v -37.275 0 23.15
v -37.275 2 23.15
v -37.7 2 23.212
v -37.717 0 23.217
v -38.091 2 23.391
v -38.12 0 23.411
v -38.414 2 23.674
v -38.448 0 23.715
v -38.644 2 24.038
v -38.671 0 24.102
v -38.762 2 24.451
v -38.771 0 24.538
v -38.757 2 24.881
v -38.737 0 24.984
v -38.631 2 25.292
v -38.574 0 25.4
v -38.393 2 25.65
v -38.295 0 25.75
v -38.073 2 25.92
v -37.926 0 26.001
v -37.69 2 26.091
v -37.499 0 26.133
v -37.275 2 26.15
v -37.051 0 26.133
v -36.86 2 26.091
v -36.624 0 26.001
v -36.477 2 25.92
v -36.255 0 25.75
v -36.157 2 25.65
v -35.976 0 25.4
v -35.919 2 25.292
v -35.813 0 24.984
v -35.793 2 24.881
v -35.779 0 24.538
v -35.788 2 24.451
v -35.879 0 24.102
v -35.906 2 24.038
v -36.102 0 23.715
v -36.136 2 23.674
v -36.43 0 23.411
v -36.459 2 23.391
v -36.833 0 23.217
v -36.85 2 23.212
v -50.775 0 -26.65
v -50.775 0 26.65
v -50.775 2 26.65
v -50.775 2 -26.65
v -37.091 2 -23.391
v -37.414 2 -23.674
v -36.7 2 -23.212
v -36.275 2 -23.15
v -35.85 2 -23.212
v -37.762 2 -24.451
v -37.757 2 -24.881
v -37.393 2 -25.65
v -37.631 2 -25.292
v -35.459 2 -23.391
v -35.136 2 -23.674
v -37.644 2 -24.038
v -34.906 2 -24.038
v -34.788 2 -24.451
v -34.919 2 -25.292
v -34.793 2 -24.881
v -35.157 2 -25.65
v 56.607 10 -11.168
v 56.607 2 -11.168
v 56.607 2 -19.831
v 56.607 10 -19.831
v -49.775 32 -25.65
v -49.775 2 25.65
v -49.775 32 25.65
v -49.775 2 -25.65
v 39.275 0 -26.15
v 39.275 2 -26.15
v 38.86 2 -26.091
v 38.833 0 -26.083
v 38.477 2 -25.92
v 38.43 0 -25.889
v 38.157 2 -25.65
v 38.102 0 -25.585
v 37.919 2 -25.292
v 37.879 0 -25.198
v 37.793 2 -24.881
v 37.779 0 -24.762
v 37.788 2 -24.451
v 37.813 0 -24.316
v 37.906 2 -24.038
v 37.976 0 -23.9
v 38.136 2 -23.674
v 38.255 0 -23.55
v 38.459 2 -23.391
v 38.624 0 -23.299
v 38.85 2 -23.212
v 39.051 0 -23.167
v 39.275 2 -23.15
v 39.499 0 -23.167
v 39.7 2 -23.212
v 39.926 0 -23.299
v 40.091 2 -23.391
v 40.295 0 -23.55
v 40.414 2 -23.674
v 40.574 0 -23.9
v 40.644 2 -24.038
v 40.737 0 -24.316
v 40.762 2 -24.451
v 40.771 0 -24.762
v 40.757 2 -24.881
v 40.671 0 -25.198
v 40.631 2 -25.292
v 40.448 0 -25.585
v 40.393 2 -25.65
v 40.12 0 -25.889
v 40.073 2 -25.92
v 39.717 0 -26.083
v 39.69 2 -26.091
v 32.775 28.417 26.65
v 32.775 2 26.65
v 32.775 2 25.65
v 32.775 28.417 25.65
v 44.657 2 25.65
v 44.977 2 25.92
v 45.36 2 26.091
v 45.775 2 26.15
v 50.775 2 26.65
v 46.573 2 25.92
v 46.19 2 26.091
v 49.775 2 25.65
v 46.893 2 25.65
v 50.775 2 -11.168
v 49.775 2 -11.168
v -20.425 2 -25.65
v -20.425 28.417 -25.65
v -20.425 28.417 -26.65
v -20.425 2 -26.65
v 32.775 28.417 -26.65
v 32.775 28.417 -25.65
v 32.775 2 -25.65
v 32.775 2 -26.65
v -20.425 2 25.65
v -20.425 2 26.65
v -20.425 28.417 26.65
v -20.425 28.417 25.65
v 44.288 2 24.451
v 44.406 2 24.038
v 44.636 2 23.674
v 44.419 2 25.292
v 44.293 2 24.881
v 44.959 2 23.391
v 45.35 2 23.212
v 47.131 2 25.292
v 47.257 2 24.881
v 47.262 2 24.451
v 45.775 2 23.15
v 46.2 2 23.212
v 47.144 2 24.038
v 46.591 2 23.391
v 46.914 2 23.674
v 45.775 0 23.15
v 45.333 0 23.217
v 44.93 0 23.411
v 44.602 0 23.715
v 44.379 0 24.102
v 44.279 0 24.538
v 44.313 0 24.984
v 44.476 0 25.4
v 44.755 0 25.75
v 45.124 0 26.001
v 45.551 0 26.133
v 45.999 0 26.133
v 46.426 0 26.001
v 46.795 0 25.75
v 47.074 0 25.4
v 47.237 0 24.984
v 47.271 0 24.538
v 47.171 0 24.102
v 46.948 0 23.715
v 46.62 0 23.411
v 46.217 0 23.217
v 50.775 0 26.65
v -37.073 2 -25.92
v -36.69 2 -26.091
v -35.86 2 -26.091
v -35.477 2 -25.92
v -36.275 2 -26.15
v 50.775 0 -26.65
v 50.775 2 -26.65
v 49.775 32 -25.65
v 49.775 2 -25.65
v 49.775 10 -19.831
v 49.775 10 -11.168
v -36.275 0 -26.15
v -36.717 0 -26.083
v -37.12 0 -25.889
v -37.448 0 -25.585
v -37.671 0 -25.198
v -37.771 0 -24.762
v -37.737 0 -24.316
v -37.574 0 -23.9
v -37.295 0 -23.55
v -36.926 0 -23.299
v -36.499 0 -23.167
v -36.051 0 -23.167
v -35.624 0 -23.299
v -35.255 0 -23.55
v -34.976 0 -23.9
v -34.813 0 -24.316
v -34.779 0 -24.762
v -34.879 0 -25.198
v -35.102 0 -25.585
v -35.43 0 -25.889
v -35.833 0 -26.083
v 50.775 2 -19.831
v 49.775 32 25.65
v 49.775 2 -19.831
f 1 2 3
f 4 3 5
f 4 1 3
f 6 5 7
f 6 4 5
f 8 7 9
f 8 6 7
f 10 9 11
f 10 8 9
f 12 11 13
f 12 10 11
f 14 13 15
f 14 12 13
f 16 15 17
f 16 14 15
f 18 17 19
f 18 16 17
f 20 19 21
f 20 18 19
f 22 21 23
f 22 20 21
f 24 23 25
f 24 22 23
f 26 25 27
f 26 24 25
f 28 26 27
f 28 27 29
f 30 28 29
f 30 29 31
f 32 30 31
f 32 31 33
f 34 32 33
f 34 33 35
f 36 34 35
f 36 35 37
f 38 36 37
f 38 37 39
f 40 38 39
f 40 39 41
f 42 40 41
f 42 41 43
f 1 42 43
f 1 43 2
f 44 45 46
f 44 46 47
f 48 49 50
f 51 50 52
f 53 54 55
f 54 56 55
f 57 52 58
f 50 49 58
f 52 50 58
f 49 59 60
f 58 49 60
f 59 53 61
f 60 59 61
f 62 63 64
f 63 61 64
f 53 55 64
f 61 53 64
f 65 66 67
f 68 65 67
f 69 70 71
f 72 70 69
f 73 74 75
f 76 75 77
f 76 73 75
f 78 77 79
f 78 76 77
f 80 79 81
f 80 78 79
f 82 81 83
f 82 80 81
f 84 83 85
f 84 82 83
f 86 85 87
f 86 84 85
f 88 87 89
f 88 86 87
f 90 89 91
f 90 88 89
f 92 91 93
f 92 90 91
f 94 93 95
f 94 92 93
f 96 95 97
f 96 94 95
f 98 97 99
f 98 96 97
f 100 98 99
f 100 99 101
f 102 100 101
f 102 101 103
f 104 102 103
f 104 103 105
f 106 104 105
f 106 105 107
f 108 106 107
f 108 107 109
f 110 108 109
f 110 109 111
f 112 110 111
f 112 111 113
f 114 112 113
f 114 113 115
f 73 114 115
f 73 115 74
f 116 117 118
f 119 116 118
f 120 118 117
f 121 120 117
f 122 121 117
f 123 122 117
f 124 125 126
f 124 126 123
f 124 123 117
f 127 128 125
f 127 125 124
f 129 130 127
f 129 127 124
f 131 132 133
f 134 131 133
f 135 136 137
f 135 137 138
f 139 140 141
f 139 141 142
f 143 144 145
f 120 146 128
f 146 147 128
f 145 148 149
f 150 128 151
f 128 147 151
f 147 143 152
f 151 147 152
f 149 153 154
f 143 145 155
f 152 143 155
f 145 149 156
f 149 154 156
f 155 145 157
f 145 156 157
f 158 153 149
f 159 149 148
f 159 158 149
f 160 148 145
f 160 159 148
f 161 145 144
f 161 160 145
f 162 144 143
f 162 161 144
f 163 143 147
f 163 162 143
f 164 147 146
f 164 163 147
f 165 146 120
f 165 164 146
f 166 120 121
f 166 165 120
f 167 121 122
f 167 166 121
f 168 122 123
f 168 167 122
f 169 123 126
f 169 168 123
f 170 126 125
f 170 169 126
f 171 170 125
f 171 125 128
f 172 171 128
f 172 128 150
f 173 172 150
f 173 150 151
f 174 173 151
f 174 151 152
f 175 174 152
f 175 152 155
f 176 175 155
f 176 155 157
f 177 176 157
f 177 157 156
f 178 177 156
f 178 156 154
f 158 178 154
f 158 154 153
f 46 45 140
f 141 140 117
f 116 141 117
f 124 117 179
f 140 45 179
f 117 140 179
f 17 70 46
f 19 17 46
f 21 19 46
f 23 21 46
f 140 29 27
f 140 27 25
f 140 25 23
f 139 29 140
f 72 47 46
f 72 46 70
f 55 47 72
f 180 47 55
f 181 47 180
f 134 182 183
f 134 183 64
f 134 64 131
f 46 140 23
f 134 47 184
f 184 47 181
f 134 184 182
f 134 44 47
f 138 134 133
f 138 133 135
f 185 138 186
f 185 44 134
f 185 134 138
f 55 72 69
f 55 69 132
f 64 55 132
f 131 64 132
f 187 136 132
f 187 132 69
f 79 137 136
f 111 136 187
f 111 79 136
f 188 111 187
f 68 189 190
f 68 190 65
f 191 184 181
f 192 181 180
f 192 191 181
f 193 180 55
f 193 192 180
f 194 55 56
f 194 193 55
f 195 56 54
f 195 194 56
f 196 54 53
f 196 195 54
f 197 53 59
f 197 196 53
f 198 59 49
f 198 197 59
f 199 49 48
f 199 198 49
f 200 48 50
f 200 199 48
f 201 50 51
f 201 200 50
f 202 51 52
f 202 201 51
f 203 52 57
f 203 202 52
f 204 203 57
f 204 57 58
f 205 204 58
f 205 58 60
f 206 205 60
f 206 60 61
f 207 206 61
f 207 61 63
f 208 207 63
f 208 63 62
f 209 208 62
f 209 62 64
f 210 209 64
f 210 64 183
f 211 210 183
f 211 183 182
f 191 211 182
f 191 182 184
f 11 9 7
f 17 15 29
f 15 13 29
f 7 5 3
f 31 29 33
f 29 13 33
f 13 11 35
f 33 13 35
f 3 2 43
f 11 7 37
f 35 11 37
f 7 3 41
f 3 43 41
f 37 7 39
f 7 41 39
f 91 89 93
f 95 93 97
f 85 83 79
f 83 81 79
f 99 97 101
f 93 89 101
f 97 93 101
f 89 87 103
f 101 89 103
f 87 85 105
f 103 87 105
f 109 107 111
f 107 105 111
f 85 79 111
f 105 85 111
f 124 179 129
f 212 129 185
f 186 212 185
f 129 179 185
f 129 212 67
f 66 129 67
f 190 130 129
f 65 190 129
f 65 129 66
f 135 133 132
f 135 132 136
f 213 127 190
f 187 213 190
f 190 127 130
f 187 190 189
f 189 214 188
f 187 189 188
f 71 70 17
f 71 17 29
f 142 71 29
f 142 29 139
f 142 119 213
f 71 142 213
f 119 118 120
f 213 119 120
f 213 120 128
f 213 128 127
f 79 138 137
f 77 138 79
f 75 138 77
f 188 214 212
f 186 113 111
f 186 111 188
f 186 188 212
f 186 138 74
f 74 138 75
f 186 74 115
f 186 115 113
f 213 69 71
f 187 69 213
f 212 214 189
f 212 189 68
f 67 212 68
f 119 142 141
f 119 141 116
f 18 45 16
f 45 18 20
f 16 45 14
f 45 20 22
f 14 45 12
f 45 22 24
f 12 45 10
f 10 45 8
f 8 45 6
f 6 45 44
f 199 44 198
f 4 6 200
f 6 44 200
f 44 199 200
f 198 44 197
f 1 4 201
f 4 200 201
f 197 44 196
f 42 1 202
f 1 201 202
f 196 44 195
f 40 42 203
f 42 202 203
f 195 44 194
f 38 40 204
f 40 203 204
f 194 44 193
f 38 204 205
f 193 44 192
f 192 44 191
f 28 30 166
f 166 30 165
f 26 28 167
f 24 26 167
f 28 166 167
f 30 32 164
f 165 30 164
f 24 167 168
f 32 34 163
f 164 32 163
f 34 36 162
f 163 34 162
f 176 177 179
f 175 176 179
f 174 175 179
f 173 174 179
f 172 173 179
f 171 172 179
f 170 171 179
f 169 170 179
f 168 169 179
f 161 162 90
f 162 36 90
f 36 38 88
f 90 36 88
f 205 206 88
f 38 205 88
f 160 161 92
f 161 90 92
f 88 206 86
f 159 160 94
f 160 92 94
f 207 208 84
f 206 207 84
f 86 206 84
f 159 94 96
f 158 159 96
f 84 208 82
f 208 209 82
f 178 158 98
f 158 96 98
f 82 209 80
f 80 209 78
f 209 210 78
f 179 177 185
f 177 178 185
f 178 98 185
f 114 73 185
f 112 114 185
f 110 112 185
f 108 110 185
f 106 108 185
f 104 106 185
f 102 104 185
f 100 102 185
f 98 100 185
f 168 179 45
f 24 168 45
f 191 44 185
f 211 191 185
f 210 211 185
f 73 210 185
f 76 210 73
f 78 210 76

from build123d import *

# Parameters (mm, degrees)
ESBO_O1_W                  = 101.55
ESBO_O1_H                  = 53.3
RESSALTO_EXTRUS_O1_DEPTH   = 2
ESBO_O2_W                  = 53.2
ESBO_O2_H                  = 53.3
RESSALTO_EXTRUS_O2_DEPTH   = 26.416687688
CORTE_EXTRUS_O2_DEPTH      = 64.136079332
CORTE_EXTRUS_O2_DEPTH_BACK = 64.64
ESBO_O5_R                  = 1.5
ESBO_O6_W                  = 99.55
ESBO_O6_H                  = 51.3
RESSALTO_EXTRUS_O4_DEPTH   = 30
ESBO_O7_W                  = 16.925657076
ESBO_O7_H                  = 8.663776605
RESSALTO_EXTRUS_O5_DEPTH   = 8


with BuildPart() as part:
    # Esboço1 → Ressalto-extrusão1 (new body)
    with BuildSketch(Plane(origin=(0, 0, 0), x_dir=(1, 0, 0), z_dir=(0, 1, 0))):
        Rectangle(ESBO_O1_W, ESBO_O1_H)
    extrude(amount=RESSALTO_EXTRUS_O1_DEPTH)

    # Esboço2 → Ressalto-extrusão2 (add)
    with BuildSketch(Plane(origin=(0, 2, 0), x_dir=(1, 0, 0), z_dir=(0, 1, 0))):
        with Locations((6.175, 0)):
            Rectangle(ESBO_O2_W, ESBO_O2_H)
    extrude(amount=RESSALTO_EXTRUS_O2_DEPTH)

    # Esboço5 → Corte-extrusão2 (cut, two sides: drawn at the far end of the back side and taken through both)
    with BuildSketch(Plane(origin=(0, 2, 0), x_dir=(1, 0, 0), z_dir=(0, 1, 0)).offset(-CORTE_EXTRUS_O2_DEPTH_BACK)):
        with Locations(Location((-37.275, -24.65, 0), (0, 0, 90))):
            Circle(ESBO_O5_R)
        with Locations(Location((45.775, -24.65, 0), (0, 0, 90))):
            Circle(ESBO_O5_R)
        with Locations(Location((-36.275, 24.65, 0), (0, 0, 90))):
            Circle(ESBO_O5_R)
        with Locations(Location((39.275, 24.65, 0), (0, 0, 90))):
            Circle(ESBO_O5_R)
    extrude(amount=CORTE_EXTRUS_O2_DEPTH + CORTE_EXTRUS_O2_DEPTH_BACK, mode=Mode.SUBTRACT)

    # Esboço6 → Ressalto-extrusão4 (add)
    with BuildSketch(Plane(origin=(0, 2, 0), x_dir=(1, 0, 0), z_dir=(0, 1, 0))):
        Rectangle(ESBO_O6_W, ESBO_O6_H)
    extrude(amount=RESSALTO_EXTRUS_O4_DEPTH)

    # Esboço7 → Ressalto-extrusão5 (add)
    with BuildSketch(Plane(origin=(0, 2, 0), x_dir=(1, 0, 0), z_dir=(0, 1, 0))):
        with Locations((48.14371548, 15.499389289)):
            Rectangle(ESBO_O7_W, ESBO_O7_H)
    extrude(amount=RESSALTO_EXTRUS_O5_DEPTH)


solid = part.part
